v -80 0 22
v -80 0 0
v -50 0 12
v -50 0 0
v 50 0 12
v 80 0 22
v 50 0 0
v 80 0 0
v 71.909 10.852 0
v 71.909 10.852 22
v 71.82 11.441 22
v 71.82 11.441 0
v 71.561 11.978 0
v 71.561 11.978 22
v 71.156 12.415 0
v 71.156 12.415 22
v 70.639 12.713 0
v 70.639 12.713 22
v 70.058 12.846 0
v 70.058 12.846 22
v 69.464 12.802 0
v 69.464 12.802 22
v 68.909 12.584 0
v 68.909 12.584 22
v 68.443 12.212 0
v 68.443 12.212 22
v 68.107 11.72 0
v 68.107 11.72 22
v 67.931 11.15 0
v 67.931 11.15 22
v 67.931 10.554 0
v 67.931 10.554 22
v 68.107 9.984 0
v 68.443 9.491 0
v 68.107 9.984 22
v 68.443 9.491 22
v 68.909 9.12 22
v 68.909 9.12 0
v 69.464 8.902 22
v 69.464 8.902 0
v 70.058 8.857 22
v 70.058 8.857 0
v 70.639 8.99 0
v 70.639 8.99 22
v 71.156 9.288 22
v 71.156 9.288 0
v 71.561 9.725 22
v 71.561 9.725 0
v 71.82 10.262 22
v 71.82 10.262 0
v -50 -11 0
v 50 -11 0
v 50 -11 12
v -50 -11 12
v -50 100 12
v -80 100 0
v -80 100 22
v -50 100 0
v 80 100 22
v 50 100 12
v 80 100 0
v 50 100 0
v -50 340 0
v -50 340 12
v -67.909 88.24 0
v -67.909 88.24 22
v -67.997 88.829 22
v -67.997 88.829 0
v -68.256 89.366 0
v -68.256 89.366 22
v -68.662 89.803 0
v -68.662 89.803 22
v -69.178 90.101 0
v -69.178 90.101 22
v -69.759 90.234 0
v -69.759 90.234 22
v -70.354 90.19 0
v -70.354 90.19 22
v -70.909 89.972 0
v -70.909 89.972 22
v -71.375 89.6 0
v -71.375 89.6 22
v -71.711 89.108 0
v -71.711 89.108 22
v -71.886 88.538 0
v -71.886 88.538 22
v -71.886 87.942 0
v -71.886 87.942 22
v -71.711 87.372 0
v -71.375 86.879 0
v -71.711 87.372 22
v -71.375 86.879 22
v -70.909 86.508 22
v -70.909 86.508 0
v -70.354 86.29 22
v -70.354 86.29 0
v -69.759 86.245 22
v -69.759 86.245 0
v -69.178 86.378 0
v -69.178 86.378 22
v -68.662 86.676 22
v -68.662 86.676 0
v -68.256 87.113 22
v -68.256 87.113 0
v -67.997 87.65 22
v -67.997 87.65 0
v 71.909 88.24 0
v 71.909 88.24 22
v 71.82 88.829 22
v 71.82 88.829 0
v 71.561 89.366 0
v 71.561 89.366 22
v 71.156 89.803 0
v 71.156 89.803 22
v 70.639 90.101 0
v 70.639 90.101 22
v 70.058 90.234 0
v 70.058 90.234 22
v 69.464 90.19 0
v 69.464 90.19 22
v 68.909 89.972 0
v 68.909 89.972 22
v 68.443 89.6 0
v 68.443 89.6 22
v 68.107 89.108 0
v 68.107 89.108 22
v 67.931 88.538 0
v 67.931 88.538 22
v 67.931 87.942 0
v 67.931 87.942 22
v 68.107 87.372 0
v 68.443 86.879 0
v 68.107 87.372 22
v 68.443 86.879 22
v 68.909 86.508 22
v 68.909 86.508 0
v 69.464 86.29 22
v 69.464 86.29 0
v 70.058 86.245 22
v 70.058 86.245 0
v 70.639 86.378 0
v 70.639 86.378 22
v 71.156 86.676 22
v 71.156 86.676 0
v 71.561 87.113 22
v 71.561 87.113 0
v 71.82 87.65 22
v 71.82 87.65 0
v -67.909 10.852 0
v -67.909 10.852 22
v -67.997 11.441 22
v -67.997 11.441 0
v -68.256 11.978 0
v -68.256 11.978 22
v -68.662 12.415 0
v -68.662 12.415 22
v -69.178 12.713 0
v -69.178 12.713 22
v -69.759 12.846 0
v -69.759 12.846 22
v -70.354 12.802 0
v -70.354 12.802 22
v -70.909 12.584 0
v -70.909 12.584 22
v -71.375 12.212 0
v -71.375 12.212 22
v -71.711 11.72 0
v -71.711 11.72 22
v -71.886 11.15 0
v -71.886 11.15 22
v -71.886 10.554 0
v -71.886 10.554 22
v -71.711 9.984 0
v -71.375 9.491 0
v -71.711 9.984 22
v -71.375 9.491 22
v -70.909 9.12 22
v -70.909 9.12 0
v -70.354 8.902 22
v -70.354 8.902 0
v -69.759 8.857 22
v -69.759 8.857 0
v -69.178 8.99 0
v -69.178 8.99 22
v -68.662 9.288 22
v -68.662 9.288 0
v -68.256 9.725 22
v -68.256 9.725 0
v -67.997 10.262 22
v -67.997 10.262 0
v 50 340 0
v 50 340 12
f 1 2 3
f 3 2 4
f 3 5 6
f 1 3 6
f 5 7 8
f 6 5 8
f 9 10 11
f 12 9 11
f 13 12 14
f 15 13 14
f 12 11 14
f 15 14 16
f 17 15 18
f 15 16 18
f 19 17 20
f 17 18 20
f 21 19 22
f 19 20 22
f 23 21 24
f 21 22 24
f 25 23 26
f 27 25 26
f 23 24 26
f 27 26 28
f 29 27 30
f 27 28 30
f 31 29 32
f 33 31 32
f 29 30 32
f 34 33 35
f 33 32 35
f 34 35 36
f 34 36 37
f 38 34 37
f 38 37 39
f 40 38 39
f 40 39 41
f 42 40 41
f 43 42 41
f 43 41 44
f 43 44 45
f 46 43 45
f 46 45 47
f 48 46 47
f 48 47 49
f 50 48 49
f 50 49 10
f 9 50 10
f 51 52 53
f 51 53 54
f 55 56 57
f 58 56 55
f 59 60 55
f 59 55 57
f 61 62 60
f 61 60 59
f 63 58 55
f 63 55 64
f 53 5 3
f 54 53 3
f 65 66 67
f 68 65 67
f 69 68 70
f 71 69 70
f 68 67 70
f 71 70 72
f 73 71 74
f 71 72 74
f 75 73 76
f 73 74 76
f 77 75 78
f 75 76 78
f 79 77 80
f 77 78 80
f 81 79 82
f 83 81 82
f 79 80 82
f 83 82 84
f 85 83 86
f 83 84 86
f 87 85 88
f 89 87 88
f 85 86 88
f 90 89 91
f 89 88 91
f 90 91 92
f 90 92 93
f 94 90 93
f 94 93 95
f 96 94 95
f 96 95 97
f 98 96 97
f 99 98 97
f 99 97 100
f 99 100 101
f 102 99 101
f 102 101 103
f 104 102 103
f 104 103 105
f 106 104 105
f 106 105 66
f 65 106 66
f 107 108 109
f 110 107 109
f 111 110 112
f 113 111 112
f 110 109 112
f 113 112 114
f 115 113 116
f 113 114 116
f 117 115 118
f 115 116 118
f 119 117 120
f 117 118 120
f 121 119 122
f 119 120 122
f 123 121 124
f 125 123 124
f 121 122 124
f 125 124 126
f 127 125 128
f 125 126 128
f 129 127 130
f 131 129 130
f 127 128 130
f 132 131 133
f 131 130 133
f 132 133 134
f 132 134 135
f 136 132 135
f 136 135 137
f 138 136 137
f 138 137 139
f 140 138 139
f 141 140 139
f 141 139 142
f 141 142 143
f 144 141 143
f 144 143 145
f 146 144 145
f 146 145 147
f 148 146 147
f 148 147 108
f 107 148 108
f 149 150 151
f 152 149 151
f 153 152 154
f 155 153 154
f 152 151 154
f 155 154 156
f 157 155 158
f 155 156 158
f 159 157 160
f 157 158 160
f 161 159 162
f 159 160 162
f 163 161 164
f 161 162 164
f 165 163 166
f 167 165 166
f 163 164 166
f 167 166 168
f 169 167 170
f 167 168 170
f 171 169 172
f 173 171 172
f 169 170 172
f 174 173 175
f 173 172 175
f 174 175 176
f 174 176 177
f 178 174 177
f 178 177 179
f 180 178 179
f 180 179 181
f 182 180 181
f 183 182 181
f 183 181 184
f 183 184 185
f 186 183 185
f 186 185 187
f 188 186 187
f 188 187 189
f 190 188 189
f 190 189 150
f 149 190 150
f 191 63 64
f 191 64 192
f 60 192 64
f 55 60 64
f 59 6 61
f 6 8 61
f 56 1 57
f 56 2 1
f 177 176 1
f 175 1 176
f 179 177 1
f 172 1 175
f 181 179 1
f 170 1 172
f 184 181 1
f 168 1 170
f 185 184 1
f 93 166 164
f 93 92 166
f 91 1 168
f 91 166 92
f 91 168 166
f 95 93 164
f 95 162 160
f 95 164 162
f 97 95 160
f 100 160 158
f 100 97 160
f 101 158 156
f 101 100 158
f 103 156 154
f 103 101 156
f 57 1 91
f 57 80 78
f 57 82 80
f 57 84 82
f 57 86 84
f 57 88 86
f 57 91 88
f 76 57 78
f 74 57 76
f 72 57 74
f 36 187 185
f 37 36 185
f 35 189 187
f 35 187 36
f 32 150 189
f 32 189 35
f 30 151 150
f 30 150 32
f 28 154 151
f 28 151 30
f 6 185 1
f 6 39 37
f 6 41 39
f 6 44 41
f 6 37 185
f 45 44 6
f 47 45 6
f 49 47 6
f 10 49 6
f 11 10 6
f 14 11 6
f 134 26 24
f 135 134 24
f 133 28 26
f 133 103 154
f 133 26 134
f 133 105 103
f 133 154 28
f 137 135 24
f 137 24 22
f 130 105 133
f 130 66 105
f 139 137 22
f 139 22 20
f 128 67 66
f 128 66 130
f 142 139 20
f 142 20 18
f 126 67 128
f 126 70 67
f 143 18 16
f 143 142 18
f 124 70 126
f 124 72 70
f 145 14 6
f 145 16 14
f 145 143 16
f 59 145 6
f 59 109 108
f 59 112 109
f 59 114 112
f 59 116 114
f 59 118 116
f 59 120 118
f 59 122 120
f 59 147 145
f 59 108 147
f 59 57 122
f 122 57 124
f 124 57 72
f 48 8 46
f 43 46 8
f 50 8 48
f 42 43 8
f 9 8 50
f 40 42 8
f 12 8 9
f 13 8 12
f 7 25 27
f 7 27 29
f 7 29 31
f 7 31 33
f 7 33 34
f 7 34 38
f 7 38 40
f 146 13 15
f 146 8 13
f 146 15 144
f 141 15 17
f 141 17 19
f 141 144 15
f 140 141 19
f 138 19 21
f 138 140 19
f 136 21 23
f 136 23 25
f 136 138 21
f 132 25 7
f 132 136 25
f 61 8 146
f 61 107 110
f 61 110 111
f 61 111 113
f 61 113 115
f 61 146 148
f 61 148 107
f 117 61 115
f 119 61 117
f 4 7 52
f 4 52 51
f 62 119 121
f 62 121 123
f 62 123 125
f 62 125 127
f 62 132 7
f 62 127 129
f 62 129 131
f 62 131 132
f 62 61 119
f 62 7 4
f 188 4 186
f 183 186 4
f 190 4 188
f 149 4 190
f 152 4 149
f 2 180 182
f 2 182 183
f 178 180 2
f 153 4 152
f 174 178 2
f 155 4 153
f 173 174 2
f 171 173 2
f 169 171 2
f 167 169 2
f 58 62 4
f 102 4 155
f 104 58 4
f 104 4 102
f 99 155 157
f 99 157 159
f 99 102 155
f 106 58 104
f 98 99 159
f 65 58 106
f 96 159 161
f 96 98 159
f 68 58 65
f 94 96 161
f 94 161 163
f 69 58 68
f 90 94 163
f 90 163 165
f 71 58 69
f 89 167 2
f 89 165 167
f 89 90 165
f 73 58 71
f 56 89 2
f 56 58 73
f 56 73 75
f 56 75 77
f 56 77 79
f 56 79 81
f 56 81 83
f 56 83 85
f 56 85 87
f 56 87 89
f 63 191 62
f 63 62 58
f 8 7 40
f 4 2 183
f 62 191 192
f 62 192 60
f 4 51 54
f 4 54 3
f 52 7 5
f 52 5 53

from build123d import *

# Parameters (mm, degrees)
PAD_DEPTH    = 12
SKETCH001_W  = 160
SKETCH001_H  = 100
PAD001_DEPTH = 10
SKETCH002_R  = 2
POCKET_DEPTH = 22.001


with BuildPart() as part:
    # Sketch → Pad (new body)
    with BuildSketch(Plane.XY):
        Polygon((-50, 340), (50, 340), (50, 100), (80, 100), (80, 0), (50, 0), (50, -11), (-50, -11), (-50, 0), (-80, 0), (-80, 100), (-50, 100), align=None)
    extrude(amount=PAD_DEPTH)

    # Sketch001 (on Face14 of Pad) → Pad001 (join)
    with BuildSketch(Plane.XY.offset(12)):
        with Locations((0, 50)):
            Rectangle(SKETCH001_W, SKETCH001_H)
    extrude(amount=PAD001_DEPTH)

    # Sketch002 (on Face18 of Pad001) → Pocket (cut, through all)
    with BuildSketch(Plane.XY.offset(22)):
        with Locations((-69.908607, 88.239746)):
            Circle(SKETCH002_R)
        with Locations((69.908607, 88.239746)):
            Circle(SKETCH002_R)
        with Locations((69.908607, 10.851752)):
            Circle(SKETCH002_R)
        with Locations((-69.908607, 10.851752)):
            Circle(SKETCH002_R)
    extrude(amount=-POCKET_DEPTH, mode=Mode.SUBTRACT)


solid = part.part
